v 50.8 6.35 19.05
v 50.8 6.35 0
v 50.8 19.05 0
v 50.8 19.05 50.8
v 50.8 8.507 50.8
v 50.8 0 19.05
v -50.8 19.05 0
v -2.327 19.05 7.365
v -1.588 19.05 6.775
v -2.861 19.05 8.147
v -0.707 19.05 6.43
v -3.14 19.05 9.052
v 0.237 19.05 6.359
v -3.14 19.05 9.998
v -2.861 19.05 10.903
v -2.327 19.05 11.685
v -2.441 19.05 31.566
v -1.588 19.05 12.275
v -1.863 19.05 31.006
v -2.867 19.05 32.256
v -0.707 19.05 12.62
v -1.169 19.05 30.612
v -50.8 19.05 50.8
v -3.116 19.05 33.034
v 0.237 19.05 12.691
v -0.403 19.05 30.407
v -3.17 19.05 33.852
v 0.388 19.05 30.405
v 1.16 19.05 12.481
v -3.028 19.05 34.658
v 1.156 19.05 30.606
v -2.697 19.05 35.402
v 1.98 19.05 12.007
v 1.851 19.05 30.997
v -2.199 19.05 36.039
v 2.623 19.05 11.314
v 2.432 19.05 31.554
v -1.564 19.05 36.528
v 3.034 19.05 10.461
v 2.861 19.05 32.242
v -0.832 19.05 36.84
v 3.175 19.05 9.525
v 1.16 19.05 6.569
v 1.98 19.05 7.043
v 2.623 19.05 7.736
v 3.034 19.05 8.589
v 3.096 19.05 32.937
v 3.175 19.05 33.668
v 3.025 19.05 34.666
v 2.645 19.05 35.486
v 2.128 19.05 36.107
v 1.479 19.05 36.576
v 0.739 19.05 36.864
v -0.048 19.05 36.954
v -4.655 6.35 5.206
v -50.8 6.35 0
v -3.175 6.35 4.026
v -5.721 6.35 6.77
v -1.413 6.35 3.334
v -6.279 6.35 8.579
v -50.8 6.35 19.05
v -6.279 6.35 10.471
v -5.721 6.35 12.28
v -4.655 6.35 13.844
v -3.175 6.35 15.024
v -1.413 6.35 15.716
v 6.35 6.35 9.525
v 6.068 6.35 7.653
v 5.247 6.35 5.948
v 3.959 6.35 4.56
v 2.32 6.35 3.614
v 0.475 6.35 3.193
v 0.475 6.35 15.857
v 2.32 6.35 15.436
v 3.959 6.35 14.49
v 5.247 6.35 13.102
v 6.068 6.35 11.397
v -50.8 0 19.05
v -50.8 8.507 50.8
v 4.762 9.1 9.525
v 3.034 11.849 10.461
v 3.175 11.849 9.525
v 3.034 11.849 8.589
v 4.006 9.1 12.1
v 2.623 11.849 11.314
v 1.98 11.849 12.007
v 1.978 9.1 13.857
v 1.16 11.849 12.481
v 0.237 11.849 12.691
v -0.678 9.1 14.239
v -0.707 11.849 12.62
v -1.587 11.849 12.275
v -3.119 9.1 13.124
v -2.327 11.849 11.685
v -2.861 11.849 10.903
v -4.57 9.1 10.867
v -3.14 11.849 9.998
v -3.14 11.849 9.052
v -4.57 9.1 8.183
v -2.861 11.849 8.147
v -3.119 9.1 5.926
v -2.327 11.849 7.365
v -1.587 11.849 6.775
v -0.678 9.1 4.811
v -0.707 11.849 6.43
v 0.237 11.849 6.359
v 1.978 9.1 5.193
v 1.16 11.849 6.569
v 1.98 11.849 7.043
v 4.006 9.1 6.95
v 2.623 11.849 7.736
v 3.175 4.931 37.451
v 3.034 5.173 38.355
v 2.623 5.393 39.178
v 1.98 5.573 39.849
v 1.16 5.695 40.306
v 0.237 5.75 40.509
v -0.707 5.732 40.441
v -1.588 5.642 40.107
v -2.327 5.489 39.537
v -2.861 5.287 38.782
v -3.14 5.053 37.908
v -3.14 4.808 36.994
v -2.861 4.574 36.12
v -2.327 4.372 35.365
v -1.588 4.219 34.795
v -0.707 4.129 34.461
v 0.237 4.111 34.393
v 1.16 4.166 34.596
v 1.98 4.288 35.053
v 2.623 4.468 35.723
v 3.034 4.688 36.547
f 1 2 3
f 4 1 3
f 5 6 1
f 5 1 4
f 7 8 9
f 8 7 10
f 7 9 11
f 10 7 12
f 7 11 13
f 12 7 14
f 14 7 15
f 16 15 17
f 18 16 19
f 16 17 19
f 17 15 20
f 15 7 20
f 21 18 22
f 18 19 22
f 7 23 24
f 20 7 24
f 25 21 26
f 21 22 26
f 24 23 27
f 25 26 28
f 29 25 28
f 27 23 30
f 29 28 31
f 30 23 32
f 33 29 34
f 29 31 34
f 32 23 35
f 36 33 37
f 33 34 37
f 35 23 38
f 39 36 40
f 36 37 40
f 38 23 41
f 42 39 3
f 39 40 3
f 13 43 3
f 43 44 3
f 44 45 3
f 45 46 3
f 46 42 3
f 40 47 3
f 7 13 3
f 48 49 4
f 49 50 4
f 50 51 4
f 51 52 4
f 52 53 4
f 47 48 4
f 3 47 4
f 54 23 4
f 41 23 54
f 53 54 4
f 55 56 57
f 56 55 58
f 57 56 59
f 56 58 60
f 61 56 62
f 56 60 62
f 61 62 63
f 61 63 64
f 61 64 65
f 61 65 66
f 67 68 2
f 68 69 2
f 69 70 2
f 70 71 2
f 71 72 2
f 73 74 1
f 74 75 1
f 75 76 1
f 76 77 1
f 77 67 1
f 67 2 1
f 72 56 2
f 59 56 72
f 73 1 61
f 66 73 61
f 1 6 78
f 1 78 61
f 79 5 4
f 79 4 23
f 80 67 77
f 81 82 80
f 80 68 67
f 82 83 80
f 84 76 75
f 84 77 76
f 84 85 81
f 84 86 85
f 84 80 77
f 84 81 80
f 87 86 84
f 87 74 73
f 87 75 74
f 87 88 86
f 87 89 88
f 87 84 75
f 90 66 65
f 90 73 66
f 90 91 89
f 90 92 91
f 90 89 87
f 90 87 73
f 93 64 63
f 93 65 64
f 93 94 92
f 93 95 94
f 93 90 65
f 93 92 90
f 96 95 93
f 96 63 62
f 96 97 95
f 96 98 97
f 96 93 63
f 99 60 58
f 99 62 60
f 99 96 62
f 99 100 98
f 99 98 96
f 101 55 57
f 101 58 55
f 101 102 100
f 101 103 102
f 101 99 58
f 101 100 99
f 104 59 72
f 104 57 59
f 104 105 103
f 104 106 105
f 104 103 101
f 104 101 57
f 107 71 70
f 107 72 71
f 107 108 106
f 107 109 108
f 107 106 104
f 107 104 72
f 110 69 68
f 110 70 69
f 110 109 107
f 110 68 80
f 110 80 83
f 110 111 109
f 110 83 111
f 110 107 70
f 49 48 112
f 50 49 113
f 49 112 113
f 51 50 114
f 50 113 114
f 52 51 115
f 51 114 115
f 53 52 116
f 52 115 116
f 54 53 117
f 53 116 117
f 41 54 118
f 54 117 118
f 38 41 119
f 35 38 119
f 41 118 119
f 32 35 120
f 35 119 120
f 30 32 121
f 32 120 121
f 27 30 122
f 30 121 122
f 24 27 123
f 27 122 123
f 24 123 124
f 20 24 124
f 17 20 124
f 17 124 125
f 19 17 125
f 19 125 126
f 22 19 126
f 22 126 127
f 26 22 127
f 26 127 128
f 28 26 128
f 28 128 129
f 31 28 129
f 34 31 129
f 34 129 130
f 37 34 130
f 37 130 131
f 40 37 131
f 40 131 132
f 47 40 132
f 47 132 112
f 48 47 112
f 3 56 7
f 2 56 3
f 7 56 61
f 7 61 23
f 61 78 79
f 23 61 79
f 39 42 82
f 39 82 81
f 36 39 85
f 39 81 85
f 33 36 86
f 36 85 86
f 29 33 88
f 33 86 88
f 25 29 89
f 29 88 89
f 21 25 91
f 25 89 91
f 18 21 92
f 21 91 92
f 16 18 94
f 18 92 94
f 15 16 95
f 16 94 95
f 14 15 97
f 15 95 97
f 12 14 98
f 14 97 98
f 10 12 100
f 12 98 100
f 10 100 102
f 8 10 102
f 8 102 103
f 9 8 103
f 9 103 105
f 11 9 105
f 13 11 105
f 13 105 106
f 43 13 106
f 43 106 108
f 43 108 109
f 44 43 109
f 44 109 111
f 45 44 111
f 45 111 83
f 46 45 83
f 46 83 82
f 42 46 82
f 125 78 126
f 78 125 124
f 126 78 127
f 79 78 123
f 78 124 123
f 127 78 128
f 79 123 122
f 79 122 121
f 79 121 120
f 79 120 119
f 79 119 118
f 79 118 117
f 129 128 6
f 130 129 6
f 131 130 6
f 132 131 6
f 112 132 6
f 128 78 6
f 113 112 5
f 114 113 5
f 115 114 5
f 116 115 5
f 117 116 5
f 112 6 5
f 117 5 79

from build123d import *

# Parameters (mm, degrees)
F0_W     = 50.8
F0_H     = 50.8
F1_DEPTH = 19.05
F2_W     = 6.35
F2_H     = 19.05
F3_DEPTH = 101.601
F4_R     = 3.175
F5_DEPTH = 23.3323898
F6_R     = 3.175
F7_DEPTH = 12.701
F8_R     = 6.35
F9_DEPTH = 6.35
F9_TAPER = 30


with BuildPart() as f1:
    # F0 (on Front) → F1 (new body)
    with BuildSketch(Plane.XZ):
        with Locations((-25.4, 25.4)):
            Rectangle(F0_W, F0_H)
        with Locations((25.4, 25.4)):
            Rectangle(F0_W, F0_H)
    extrude(amount=-F1_DEPTH)

    # F2 (on face) → F3 (cut, through all)
    with BuildSketch(Plane.YZ.offset(50.8)):
        Polygon((0, 50.8), (0, 19.05), (8.5073868597, 50.8), align=None)
        with Locations((3.175, 9.525)):
            Rectangle(F2_W, F2_H)
    extrude(amount=-F3_DEPTH, mode=Mode.SUBTRACT)

    # F4 (on face) → F5 (cut, through all)
    with BuildSketch(Plane(origin=(0, -4.7625, 1.276108029), x_dir=(1, 0, 0), z_dir=(0, -0.9659258263, 0.2588190451))):
        with Locations((0, 37.4508869908)):
            Circle(F4_R)
    extrude(amount=-F5_DEPTH, mode=Mode.SUBTRACT)

    # F6 (on face) → F7 (cut, through all)
    with BuildSketch(Plane.XZ.offset(-6.35)):
        with Locations((0, 9.525)):
            Circle(F6_R)
    extrude(amount=-F7_DEPTH, mode=Mode.SUBTRACT)

    # F8 (on face) → F9 (cut)
    with BuildSketch(Plane.XZ.offset(-6.35)):
        with Locations((0, 9.525)):
            Circle(F8_R)
    extrude(amount=-F9_DEPTH, taper=F9_TAPER, mode=Mode.SUBTRACT)


solid = f1.part
